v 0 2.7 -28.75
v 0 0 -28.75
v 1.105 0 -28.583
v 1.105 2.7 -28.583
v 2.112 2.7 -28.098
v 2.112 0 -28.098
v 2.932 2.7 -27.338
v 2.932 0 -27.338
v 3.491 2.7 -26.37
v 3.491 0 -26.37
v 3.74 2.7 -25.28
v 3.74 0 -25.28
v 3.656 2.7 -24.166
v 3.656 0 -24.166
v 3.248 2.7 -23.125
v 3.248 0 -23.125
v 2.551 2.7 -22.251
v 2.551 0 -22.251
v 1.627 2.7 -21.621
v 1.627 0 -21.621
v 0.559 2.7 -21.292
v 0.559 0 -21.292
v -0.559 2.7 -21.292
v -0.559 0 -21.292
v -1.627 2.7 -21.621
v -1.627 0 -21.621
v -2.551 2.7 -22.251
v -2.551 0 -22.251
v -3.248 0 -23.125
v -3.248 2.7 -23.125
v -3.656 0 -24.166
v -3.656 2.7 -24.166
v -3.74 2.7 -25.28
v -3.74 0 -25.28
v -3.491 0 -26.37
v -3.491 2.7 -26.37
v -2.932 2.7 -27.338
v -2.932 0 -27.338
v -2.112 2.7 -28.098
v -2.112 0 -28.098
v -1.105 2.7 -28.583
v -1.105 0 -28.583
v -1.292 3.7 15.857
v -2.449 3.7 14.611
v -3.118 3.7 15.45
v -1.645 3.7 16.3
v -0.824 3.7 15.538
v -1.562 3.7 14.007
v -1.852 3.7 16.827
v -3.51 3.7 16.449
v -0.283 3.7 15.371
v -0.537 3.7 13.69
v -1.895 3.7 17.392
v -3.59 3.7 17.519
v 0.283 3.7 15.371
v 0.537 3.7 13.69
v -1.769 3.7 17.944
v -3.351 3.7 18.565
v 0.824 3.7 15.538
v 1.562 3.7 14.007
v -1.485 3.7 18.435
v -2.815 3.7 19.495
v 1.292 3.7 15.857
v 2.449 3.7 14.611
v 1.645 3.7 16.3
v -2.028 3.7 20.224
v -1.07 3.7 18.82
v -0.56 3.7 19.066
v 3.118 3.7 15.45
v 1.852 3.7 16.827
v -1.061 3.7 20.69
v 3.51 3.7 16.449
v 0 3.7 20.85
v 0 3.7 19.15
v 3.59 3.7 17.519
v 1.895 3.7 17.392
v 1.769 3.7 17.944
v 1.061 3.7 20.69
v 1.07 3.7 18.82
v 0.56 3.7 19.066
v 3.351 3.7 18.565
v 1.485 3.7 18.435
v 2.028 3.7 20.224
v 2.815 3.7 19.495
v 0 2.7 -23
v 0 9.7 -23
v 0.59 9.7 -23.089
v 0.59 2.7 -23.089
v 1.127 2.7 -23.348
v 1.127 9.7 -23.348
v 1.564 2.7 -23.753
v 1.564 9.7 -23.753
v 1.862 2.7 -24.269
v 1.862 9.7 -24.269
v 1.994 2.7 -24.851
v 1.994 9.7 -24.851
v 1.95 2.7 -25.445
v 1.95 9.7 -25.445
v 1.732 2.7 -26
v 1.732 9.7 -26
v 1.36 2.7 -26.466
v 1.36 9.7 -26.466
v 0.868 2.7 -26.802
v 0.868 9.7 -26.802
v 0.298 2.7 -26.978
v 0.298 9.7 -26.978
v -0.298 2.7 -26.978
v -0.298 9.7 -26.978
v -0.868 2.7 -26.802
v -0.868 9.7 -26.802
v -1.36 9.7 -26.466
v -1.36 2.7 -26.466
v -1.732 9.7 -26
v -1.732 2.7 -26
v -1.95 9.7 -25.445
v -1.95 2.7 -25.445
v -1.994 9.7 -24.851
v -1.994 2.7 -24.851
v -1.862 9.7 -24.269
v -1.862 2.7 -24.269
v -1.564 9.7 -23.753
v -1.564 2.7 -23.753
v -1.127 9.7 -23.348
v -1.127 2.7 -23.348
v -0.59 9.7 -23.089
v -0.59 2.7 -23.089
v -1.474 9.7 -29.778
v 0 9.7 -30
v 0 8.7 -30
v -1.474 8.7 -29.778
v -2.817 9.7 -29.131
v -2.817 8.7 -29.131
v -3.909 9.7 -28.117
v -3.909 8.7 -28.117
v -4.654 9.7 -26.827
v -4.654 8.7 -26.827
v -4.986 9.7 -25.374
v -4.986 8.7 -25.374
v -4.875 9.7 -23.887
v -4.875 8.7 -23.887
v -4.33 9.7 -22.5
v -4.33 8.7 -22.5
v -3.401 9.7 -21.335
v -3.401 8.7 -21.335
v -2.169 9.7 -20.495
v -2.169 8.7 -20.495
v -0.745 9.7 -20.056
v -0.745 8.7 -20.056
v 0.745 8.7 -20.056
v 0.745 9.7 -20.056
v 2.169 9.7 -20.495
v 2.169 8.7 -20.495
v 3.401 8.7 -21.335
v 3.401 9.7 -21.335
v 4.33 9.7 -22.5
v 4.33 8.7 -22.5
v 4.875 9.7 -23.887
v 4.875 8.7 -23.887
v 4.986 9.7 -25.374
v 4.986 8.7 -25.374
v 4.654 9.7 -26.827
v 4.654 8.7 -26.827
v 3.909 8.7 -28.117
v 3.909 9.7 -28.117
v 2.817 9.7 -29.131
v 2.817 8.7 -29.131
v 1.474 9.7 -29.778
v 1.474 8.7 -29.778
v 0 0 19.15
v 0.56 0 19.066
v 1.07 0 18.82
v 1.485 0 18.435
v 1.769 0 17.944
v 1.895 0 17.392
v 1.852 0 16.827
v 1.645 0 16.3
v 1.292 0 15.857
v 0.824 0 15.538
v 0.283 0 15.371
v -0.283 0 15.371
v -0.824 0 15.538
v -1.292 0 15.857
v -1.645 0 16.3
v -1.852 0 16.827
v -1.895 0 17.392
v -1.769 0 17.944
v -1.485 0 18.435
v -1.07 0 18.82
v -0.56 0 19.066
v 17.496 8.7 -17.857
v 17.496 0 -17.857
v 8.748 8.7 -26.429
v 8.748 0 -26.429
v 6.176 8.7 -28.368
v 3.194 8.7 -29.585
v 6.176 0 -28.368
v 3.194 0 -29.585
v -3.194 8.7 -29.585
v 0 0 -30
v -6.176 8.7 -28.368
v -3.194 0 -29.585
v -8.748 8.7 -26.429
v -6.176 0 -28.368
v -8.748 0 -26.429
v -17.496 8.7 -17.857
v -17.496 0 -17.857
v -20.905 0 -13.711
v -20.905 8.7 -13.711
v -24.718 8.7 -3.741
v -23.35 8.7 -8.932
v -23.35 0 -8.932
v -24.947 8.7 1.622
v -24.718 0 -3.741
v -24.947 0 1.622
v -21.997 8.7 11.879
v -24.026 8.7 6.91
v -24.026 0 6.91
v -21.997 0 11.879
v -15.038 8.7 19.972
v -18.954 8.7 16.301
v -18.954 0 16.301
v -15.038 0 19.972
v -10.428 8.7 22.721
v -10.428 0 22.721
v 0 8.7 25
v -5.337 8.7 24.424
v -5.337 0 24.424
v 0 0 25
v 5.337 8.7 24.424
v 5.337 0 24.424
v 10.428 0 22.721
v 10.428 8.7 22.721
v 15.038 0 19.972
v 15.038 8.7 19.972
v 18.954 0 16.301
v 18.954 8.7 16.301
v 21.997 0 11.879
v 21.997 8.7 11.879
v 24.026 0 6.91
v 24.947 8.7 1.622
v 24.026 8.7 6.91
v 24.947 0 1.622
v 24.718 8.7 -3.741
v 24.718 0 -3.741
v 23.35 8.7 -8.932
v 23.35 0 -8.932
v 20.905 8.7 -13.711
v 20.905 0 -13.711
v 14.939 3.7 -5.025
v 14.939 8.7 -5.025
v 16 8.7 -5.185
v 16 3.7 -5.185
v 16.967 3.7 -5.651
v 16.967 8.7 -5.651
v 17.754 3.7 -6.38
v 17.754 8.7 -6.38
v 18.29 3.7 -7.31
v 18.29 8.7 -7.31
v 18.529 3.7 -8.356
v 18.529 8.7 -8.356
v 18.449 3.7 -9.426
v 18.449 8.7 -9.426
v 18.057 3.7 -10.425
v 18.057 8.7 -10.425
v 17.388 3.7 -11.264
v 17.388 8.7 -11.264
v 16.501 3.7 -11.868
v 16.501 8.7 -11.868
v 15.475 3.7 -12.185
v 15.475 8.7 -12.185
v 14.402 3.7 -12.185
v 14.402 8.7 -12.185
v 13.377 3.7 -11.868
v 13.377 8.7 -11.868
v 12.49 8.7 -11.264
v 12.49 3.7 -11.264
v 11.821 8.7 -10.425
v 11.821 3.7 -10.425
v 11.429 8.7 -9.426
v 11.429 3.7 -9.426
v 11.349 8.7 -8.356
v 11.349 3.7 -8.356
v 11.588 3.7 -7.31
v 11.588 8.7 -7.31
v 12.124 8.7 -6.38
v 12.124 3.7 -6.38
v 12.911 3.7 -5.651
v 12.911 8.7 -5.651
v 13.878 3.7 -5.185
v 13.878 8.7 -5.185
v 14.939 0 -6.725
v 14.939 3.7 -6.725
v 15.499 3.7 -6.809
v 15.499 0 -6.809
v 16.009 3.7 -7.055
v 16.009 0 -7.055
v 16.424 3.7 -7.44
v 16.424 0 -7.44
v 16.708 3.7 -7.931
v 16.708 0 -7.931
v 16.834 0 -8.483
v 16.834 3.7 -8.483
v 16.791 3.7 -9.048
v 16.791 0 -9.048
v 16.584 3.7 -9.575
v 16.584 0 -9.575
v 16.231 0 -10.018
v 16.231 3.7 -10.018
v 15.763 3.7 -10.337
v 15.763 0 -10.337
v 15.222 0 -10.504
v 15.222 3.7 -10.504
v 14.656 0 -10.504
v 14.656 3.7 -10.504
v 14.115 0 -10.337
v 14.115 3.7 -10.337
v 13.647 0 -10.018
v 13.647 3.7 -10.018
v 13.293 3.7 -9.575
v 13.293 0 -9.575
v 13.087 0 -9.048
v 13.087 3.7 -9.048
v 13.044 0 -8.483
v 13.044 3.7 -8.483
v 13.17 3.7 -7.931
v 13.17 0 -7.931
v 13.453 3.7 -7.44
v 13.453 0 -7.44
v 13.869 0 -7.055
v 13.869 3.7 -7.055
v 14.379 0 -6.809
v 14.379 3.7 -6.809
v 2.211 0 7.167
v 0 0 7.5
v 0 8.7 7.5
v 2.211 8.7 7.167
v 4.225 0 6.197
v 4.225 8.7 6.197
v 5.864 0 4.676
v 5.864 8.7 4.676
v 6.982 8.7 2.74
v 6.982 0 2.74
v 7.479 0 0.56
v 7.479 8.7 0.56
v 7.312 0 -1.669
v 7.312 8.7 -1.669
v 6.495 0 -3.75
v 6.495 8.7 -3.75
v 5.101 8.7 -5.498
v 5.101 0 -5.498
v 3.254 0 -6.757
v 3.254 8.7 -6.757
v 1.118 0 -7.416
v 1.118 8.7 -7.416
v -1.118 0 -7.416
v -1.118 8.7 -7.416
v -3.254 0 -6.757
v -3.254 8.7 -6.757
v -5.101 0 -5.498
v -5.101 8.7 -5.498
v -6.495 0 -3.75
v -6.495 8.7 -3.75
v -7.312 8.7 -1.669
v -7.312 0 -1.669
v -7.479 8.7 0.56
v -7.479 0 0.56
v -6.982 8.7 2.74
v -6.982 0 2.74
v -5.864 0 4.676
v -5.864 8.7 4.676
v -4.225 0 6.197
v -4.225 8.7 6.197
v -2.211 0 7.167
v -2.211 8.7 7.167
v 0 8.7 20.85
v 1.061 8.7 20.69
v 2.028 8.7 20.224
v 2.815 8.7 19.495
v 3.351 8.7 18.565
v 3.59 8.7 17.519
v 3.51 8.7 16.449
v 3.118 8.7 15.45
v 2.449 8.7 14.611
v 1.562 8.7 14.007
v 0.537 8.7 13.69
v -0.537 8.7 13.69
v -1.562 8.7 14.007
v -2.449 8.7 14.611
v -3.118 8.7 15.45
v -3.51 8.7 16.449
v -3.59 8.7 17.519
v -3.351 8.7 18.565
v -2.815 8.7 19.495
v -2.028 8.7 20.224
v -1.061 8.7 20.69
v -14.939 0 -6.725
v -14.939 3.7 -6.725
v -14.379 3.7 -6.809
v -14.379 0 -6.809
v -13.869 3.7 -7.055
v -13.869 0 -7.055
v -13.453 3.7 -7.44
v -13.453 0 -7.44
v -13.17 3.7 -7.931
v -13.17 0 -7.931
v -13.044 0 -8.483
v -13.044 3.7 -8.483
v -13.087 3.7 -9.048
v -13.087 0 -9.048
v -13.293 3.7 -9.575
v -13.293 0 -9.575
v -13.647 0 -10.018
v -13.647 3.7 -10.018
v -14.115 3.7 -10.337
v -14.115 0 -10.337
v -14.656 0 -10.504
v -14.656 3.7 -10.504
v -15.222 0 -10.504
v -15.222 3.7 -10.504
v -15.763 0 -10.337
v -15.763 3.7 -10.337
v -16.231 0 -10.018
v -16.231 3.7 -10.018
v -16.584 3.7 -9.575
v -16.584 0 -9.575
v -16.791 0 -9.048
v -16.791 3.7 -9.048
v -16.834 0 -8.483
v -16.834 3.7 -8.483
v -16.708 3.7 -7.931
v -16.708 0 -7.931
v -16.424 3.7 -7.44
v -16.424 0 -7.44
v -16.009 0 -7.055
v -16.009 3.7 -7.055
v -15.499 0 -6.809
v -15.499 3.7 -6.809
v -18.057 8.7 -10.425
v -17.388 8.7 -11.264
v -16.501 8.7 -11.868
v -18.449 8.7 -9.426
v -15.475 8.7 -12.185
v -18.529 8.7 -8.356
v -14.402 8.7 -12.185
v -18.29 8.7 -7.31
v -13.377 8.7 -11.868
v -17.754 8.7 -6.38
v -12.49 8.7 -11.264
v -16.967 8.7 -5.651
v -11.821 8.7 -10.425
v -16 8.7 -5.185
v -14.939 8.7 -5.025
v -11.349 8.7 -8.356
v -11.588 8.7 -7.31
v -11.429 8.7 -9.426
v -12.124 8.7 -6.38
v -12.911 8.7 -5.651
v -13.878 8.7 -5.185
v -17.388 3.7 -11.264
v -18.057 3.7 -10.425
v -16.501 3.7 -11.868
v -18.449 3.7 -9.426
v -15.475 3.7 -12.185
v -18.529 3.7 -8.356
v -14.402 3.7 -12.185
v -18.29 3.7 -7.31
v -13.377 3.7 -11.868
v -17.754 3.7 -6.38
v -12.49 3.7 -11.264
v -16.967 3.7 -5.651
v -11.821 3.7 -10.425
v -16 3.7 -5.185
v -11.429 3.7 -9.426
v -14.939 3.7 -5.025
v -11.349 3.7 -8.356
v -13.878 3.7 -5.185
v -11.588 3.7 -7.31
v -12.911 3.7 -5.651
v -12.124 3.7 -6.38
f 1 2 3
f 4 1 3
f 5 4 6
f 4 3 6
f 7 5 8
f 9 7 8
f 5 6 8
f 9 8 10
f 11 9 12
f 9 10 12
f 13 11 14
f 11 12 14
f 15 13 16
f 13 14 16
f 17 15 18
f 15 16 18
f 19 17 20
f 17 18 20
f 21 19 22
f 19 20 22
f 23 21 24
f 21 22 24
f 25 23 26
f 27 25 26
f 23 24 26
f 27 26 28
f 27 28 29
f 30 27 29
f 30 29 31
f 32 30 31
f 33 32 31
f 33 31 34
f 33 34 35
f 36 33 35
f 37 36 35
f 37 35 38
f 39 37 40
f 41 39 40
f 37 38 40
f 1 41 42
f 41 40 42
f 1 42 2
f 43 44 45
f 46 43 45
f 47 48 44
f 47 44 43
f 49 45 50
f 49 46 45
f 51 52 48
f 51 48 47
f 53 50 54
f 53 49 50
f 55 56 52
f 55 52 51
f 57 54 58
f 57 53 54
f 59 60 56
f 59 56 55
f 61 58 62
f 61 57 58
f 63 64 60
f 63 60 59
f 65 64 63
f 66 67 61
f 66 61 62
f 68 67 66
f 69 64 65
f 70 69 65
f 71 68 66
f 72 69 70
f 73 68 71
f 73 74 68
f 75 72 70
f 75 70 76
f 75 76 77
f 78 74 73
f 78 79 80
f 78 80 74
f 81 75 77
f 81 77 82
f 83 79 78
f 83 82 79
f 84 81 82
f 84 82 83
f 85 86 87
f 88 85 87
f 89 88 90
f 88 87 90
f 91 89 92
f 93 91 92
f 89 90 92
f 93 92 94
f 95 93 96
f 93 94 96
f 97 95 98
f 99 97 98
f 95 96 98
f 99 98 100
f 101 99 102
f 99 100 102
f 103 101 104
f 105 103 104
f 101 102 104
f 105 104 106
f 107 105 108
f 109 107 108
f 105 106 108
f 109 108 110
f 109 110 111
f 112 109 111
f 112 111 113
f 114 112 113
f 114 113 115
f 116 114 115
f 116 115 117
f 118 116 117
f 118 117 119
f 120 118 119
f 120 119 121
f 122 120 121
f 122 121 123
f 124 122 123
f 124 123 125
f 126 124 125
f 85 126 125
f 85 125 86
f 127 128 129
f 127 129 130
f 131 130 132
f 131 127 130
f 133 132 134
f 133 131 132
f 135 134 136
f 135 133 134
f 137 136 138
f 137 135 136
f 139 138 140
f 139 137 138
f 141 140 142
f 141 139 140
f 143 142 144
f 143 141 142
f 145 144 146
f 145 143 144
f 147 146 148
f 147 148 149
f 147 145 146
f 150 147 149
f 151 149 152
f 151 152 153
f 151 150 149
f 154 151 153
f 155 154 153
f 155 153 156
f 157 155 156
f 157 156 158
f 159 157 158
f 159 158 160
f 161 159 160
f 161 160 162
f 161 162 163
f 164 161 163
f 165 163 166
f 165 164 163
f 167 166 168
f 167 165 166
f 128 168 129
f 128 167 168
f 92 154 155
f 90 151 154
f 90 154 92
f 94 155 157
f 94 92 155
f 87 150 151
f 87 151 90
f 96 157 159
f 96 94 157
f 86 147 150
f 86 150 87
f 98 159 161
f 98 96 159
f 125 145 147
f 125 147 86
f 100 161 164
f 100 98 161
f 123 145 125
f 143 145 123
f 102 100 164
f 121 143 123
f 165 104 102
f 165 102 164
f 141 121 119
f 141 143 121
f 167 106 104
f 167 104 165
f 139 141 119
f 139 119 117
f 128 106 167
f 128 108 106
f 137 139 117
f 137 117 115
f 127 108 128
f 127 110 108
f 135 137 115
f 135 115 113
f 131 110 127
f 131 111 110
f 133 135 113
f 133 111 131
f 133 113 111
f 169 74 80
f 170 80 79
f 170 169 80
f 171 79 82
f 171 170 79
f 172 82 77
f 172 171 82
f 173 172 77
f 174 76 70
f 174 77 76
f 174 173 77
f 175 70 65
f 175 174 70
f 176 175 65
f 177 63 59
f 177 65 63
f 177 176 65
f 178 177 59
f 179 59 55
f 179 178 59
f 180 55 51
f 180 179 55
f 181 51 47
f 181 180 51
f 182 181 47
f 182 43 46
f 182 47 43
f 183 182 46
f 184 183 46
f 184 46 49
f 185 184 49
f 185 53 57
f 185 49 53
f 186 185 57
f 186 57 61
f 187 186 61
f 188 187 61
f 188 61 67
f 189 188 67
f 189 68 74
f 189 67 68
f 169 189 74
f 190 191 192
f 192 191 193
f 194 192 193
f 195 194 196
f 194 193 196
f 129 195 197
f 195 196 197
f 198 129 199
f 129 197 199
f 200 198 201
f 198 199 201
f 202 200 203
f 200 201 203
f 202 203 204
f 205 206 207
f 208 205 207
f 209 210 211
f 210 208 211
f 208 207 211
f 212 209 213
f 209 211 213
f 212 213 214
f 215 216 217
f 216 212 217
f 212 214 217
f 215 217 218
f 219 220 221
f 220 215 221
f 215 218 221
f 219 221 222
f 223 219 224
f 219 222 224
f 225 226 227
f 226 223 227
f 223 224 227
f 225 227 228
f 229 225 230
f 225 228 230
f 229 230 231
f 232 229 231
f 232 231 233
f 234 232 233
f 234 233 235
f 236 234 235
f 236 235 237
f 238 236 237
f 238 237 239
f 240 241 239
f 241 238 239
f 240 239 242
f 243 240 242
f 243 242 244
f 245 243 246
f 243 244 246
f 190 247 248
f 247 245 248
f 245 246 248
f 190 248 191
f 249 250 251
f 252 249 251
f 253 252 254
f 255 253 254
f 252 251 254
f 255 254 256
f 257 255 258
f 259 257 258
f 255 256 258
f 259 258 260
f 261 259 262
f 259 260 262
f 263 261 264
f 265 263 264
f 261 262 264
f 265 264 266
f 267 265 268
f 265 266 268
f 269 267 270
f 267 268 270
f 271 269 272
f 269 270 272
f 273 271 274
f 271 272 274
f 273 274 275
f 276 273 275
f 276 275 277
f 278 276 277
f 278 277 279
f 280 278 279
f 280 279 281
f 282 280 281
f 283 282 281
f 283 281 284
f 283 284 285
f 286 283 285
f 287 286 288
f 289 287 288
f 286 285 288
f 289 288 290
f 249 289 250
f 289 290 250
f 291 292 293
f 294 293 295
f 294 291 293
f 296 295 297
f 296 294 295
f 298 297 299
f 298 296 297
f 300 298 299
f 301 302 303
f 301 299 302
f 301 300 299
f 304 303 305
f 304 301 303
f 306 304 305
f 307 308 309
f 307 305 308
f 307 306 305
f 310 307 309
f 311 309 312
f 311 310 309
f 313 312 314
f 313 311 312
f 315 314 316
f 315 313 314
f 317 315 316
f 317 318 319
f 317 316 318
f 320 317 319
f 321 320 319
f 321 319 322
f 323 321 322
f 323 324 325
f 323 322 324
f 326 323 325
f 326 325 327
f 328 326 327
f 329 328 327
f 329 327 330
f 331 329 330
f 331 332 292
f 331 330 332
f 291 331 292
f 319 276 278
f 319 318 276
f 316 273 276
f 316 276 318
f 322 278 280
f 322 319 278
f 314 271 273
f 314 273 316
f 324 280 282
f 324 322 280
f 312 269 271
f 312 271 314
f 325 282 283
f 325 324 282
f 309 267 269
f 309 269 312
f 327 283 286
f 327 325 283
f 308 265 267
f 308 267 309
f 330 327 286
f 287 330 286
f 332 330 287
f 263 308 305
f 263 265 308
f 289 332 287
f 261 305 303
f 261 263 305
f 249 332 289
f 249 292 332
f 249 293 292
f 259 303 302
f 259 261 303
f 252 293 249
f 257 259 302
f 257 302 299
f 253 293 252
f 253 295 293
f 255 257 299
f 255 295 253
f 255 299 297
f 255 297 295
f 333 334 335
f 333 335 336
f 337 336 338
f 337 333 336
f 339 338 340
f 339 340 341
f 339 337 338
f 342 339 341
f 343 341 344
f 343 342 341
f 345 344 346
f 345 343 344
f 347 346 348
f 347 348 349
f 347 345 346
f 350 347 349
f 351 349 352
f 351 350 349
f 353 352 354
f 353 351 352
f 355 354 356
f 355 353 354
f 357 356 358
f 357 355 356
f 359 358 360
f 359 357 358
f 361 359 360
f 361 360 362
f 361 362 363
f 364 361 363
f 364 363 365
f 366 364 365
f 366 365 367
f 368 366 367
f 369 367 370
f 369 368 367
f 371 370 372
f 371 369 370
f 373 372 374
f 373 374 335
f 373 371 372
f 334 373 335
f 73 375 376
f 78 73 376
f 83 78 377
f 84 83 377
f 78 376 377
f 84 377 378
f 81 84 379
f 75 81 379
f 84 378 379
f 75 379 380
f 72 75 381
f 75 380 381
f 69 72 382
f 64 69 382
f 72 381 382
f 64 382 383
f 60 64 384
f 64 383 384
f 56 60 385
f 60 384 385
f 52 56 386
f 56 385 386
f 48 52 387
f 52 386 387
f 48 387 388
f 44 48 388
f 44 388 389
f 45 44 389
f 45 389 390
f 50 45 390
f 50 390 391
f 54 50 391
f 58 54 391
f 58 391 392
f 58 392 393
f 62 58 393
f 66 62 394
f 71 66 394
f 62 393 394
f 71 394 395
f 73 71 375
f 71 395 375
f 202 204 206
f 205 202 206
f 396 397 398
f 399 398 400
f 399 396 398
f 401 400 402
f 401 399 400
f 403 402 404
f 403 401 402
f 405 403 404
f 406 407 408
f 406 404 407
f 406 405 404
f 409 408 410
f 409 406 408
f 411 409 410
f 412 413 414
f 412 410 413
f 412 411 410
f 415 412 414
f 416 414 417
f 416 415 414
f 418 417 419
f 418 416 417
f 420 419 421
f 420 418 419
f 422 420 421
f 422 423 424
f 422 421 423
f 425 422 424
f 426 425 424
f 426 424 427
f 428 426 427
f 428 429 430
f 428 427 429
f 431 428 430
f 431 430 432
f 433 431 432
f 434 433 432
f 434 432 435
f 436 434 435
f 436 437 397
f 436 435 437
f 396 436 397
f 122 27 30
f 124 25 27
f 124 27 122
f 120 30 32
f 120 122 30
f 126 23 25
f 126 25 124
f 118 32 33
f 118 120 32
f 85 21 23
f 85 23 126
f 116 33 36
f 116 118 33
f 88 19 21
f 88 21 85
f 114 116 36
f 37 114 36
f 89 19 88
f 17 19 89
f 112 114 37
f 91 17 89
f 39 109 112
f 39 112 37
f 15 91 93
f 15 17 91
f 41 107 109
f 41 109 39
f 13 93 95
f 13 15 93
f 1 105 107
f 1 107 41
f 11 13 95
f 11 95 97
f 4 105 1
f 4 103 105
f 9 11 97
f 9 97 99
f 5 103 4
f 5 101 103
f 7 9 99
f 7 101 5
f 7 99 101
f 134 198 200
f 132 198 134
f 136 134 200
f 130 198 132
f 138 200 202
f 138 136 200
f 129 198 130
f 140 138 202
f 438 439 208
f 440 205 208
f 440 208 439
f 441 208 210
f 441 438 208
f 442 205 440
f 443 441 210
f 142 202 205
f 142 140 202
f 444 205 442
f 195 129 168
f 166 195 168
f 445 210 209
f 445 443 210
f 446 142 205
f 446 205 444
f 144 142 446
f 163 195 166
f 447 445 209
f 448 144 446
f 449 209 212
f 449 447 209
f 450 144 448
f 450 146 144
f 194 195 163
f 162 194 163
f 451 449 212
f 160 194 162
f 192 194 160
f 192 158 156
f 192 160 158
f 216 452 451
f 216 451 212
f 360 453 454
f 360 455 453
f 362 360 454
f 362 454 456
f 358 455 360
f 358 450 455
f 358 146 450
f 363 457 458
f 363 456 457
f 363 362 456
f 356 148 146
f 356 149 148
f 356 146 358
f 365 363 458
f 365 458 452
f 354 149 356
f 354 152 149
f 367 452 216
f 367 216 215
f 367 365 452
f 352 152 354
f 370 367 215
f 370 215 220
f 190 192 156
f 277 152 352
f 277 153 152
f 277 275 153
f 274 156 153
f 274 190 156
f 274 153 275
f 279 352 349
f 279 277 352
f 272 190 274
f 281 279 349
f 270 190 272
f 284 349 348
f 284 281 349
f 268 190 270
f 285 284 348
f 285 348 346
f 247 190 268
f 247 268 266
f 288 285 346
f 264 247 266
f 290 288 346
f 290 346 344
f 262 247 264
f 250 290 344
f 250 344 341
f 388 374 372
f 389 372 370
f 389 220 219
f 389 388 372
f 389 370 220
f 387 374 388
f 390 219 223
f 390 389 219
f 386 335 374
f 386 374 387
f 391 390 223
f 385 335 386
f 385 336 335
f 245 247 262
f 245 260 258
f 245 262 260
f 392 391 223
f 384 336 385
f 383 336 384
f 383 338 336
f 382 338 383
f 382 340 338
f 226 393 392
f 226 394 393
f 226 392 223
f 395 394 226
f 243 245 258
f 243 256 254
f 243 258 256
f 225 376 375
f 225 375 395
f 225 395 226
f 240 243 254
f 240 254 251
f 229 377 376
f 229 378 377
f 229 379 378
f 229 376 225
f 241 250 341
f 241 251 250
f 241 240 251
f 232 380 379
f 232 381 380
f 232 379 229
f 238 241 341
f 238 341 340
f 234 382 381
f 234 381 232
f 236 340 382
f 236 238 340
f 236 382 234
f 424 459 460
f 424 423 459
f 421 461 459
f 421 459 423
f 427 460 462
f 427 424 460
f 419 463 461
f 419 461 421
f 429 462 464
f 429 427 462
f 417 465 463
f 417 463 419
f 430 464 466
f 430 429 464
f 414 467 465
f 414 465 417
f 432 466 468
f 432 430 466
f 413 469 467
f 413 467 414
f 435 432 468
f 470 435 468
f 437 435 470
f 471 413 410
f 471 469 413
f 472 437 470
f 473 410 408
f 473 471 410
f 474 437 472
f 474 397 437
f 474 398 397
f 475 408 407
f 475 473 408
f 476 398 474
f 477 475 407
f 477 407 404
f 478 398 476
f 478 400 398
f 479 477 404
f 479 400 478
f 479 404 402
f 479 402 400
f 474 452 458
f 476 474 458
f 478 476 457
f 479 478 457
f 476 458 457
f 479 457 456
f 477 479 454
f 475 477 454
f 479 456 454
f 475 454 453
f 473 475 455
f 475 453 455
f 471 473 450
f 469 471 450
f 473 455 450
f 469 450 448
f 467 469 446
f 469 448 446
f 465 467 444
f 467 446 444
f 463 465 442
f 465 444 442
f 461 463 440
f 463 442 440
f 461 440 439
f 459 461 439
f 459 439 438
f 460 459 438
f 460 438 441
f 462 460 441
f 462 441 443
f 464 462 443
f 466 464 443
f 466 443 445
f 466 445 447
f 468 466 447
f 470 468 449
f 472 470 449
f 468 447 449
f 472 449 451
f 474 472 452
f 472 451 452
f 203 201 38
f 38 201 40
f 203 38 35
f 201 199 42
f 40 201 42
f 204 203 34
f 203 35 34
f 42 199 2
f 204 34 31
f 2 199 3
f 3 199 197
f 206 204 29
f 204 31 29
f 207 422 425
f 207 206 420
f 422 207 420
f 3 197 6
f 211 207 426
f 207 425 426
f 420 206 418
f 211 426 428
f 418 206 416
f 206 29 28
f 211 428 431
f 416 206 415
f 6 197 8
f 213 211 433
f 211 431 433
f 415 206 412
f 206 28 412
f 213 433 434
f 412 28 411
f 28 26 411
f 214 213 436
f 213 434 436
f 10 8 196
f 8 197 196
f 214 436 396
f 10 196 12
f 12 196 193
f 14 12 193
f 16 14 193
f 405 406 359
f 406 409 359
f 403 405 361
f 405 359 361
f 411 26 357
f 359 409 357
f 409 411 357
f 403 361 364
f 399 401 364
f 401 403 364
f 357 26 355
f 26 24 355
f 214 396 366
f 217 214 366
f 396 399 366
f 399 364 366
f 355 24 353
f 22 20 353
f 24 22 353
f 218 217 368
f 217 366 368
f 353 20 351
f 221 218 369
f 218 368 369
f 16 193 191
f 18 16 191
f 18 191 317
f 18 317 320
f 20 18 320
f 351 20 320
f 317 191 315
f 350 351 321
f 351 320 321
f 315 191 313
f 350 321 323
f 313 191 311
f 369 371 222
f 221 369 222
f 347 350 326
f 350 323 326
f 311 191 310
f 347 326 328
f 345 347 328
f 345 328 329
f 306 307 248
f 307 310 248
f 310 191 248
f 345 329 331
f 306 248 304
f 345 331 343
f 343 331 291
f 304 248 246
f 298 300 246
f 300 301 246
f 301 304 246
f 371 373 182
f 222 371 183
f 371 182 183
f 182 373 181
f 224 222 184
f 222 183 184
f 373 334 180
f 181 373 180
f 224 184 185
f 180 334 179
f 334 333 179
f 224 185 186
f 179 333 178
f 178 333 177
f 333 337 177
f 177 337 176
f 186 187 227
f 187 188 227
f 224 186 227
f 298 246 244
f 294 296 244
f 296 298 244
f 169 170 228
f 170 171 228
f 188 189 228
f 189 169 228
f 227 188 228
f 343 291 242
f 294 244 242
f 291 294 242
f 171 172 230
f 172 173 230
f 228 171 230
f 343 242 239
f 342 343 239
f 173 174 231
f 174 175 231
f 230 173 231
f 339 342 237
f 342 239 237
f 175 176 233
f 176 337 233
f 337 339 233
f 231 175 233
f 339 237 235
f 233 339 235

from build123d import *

# Parameters (mm, degrees)
SKETCH_1_R          = 25
SKETCH_1_R_2        = 1.9
SKETCH_1_R_3        = 7.5
EXTRUDE_1_DEPTH     = 8.7
SKETCH_2_R          = 3.6
CUT_EXTRUDE_1_DEPTH = 5
EXTRUDE_START       = -8.7
EXTRUDE_4_DEPTH     = 8.7
SKETCH_14_R         = 2
CUT_EXTRUDE_5_DEPTH = 41.00862407
EXTRUDE_START_2     = 1
SKETCH_15_R         = 5
SKETCH_15_R_2       = 2
EXTRUDE_5_DEPTH     = 1
SKETCH_19_R         = 3.75
CUT_EXTRUDE_7_DEPTH = 2.7


with BuildPart() as part:
    # 草图1 → 凸台-拉伸1 (new body)
    with BuildSketch(Plane(origin=(0, 0, 0), x_dir=(1, 0, 0), z_dir=(0, 1, 0))):
        with Locations(Location((0, 0, 0), (0, 0, 270))):
            Circle(SKETCH_1_R)
        with Locations(Location((14.938938215, 8.625, 0), (0, 0, 270))):
            Circle(SKETCH_1_R_2, mode=Mode.SUBTRACT)
        with Locations(Location((0, -17.25, 0), (0, 0, 270))):
            Circle(SKETCH_1_R_2, mode=Mode.SUBTRACT)
        with Locations(Location((-14.938938215, 8.625, 0), (0, 0, 270))):
            Circle(SKETCH_1_R_2, mode=Mode.SUBTRACT)
        with Locations(Location((0, 0, 0), (0, 0, 270))):
            Circle(SKETCH_1_R_3, mode=Mode.SUBTRACT)
    extrude(amount=EXTRUDE_1_DEPTH)

    # 草图2 → 切除-拉伸1 (cut)
    with BuildSketch(Plane(origin=(0, 8.7, 0), x_dir=(1, 0, 0), z_dir=(0, 1, 0))):
        with Locations(Location((0, -17.25, 0), (0, 0, 270))):
            Circle(SKETCH_2_R)
        with Locations(Location((-14.938938215, 8.625, 0), (0, 0, 270))):
            Circle(SKETCH_2_R)
        with Locations(Location((14.938938215, 8.625, 0), (0, 0, 270))):
            Circle(SKETCH_2_R)
    extrude(amount=-CUT_EXTRUDE_1_DEPTH, mode=Mode.SUBTRACT)

    # 草图13 → 凸台-拉伸4 (add)
    with BuildSketch(Plane(origin=(0, 8.7, 0), x_dir=(1, 0, 0), z_dir=(0, 1, 0)).offset(EXTRUDE_START)):
        with BuildLine():
            Line((-8.748177653, 26.428571429), (-17.496355306, 17.857142857))
            ThreePointArc((-17.496355306, 17.857142857), (0, 25), (17.496355306, 17.857142857))
            Line((17.496355306, 17.857142857), (8.748177653, 26.428571429))
            ThreePointArc((8.748177653, 26.428571429), (0, 30), (-8.748177653, 26.428571429))
        make_face()
    extrude(amount=EXTRUDE_4_DEPTH)

    # 草图14 → 切除-拉伸5 (cut, through all)
    with BuildSketch(Plane(origin=(0, 8.7, 0), x_dir=(1, 0, 0), z_dir=(0, 1, 0))):
        with Locations(Location((0, 25, 0), (0, 0, 270))):
            Circle(SKETCH_14_R)
    extrude(amount=-CUT_EXTRUDE_5_DEPTH, mode=Mode.SUBTRACT)

    # 草图15 → 凸台-拉伸5 (add)
    with BuildSketch(Plane(origin=(0, 8.7, 0), x_dir=(1, 0, 0), z_dir=(0, 1, 0)).offset(EXTRUDE_START_2)):
        with Locations(Location((0, 25, 0), (0, 0, 89.99953218))):
            Circle(SKETCH_15_R)
        with Locations(Location((0, 25, 0), (0, 0, 270))):
            Circle(SKETCH_15_R_2, mode=Mode.SUBTRACT)
    extrude(amount=-EXTRUDE_5_DEPTH)

    # 草图19 → 切除-拉伸7 (cut)
    with BuildSketch(Plane.XZ):
        with Locations(Location((0, -25, 0), (0, 0, 270))):
            Circle(SKETCH_19_R)
    extrude(amount=-CUT_EXTRUDE_7_DEPTH, mode=Mode.SUBTRACT)


solid = part.part
